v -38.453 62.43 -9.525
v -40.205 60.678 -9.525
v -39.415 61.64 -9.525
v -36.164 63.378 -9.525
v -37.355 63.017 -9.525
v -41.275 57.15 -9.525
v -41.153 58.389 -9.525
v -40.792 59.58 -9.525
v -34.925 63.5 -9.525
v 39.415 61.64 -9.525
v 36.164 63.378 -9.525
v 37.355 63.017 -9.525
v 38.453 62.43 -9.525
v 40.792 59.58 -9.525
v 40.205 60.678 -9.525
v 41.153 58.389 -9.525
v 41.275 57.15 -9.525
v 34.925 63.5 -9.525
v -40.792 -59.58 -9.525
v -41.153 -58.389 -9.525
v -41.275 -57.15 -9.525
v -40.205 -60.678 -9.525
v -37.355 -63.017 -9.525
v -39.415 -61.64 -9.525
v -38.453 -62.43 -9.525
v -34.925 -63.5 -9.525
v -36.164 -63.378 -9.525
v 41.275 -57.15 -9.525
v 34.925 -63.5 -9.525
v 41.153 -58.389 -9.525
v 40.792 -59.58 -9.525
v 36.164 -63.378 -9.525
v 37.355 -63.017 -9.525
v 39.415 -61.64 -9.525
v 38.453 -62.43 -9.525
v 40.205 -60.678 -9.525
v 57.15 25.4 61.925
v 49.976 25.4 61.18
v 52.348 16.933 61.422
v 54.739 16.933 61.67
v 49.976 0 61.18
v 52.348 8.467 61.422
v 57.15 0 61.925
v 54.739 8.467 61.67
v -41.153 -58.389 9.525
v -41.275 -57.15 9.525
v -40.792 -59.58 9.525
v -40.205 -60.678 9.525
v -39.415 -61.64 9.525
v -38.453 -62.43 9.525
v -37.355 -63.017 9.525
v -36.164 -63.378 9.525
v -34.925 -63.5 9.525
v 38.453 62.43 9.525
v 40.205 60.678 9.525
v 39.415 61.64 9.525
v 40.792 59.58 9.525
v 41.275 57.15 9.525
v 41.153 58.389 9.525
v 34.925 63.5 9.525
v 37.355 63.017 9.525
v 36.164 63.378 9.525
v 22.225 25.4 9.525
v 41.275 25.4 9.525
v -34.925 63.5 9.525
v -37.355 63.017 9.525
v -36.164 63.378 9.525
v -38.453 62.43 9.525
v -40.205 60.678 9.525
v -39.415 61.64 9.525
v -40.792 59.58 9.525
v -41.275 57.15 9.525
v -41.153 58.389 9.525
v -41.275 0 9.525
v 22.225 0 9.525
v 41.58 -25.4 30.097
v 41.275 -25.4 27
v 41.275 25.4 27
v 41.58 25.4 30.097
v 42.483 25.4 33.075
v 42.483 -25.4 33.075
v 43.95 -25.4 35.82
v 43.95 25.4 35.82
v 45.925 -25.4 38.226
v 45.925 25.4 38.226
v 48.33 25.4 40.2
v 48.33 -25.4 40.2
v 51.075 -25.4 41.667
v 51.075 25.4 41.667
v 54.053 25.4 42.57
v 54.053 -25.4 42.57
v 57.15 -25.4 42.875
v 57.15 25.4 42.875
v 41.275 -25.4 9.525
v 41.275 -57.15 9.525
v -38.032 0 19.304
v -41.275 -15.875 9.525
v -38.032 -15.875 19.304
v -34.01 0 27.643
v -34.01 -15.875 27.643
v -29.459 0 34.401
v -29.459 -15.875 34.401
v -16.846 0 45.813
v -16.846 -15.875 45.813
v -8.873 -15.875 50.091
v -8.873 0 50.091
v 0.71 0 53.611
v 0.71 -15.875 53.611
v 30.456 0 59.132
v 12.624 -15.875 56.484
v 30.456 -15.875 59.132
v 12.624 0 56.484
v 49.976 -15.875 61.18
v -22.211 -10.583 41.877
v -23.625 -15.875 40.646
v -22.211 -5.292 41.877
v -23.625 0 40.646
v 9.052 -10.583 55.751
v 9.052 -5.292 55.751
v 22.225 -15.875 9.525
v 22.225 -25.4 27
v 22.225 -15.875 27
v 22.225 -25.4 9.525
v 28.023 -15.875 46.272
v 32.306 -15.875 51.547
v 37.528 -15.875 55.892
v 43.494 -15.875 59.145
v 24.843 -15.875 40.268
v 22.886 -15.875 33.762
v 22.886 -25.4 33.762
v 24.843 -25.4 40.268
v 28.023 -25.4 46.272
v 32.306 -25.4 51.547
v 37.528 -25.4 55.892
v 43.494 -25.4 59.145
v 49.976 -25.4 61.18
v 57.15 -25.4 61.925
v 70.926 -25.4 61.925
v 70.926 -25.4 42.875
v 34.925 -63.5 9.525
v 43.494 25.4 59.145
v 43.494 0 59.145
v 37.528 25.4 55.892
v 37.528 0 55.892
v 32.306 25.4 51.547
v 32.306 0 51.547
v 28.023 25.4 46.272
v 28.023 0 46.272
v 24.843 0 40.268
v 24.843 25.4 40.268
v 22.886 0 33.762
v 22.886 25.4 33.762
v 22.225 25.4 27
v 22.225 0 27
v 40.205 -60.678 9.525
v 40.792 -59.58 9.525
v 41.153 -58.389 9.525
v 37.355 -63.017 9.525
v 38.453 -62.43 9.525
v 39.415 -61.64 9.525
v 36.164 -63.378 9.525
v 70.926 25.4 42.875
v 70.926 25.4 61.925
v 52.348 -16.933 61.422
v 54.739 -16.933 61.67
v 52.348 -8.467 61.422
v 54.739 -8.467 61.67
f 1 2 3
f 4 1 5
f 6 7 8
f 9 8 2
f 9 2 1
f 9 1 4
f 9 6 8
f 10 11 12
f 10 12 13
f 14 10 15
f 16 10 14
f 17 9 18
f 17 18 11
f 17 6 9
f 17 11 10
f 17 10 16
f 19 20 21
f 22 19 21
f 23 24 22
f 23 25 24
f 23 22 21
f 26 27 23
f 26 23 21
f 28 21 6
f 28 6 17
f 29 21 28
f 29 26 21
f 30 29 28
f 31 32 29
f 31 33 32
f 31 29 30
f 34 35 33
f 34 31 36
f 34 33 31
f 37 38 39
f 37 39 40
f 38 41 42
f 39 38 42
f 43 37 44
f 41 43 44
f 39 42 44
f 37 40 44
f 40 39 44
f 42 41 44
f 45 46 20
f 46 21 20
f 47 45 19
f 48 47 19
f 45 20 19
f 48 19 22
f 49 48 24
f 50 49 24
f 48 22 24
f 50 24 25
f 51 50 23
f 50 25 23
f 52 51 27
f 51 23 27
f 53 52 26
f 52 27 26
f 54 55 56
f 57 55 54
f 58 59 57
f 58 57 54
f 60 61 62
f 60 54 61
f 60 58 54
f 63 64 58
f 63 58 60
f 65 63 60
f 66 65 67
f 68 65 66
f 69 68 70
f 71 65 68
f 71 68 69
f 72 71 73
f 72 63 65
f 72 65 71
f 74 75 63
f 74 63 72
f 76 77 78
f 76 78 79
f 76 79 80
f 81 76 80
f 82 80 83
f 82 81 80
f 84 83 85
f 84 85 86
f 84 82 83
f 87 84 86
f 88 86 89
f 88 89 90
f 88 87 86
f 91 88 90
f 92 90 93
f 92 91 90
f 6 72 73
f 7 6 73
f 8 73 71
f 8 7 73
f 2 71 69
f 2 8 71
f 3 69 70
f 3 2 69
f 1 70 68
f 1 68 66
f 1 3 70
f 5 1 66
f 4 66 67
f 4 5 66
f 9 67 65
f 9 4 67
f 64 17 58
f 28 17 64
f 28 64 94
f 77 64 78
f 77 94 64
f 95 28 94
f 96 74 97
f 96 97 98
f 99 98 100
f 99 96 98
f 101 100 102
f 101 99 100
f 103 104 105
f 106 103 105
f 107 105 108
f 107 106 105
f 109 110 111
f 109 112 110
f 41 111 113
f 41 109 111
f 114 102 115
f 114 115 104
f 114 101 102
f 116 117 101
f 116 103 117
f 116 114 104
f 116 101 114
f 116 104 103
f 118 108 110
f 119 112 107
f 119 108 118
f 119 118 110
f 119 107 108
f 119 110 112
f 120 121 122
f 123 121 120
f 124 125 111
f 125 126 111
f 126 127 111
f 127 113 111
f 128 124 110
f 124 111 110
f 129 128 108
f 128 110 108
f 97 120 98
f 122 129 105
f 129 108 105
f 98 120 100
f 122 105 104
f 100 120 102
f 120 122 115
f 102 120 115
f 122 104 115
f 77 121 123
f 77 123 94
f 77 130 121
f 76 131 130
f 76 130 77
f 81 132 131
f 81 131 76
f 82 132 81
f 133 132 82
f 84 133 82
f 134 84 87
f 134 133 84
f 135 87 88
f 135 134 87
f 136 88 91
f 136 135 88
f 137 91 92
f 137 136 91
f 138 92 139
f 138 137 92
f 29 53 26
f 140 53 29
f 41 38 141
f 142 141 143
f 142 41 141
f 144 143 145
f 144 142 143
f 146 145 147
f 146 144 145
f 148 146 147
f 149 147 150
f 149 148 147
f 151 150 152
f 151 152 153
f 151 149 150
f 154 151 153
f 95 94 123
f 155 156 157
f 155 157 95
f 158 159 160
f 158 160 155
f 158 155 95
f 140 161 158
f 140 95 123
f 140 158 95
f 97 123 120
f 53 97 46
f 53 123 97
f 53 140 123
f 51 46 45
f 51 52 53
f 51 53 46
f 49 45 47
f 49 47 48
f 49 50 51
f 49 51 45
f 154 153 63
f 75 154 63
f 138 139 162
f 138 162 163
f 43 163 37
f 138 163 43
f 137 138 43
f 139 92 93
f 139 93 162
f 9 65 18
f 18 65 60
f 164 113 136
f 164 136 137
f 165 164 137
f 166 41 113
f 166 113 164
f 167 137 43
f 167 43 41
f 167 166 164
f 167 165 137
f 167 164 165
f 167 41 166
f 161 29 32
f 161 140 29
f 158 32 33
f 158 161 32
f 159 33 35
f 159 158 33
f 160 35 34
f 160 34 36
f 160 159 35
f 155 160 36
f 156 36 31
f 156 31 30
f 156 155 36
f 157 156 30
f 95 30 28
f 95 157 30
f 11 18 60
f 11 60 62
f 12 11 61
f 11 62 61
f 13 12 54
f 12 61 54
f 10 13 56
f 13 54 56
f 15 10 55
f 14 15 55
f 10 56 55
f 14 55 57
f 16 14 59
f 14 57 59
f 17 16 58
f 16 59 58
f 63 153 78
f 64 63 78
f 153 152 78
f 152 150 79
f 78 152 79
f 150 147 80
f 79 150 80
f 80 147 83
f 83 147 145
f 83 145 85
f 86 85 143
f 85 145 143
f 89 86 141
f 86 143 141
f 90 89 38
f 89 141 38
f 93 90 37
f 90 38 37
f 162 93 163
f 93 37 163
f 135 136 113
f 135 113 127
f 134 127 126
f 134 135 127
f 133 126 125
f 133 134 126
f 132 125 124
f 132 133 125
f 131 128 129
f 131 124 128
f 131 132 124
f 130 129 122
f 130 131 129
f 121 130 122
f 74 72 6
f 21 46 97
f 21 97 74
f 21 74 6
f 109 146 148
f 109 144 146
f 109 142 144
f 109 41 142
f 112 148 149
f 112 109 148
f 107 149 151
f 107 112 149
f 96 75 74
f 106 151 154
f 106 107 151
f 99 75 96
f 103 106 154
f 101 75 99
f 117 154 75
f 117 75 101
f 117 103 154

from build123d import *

# Parameters (mm, degrees)
F1_DEPTH = 63.5
F0_W     = 10.6006153176
F0_H     = 19.05
F2_DEPTH = 25.4
F3_DEPTH = 15.875
F4_R     = 6.35


with BuildPart() as f1:
    # F0 (on Front) → F1 (new body, symmetric)
    with BuildSketch(Plane.XZ):
        Polygon((22.225, 9.525), (-41.275, 9.525), (-41.275, -9.525), (41.275, -9.525), (41.275, 9.525), align=None)
    extrude(amount=F1_DEPTH, both=True)

    # F0 (on Front) → F2 (join, symmetric)
    with BuildSketch(Plane.XZ):
        with BuildLine():
            Line((22.225, 27.0002), (22.225, 9.525))
            Line((22.225, 9.525), (41.275, 9.525))
            Line((41.275, 9.525), (41.275, 27.0002))
            ThreePointArc((41.275, 27.0002), (45.9246798487, 38.2255201513), (57.15, 42.8752))
            Line((57.15, 42.8752), (60.325, 42.8752))
            Line((60.325, 42.8752), (60.325, 61.9252))
            Line((60.325, 61.9252), (57.15, 61.9252))
            add(Edge.make_bspline(
                [(49.9755002141, 61.180343034), (52.3379879204, 61.4198350187), (54.7300422112, 61.6659292139), (57.15, 61.9252)],
                knots=[105.9316998893, 105.9316998893, 105.9316998893, 105.9316998893, 111.5045361635, 111.5045361635, 111.5045361635, 111.5045361635], degree=3))
            ThreePointArc((49.9755002141, 61.180343034), (30.036119514, 49.0136756454), (22.225, 27.0002))
        make_face()
        with Locations((65.6253076588, 52.4002)):
            Rectangle(F0_W, F0_H)
    extrude(amount=F2_DEPTH, both=True)

    # F0 (on Front) → F3 (join)
    with BuildSketch(Plane.XZ):
        with BuildLine():
            add(Edge.make_bspline(
                [(-41.275, 9.525), (-29.1563910851, 54.461089134), (5.067965455, 56.6279406654), (49.9755002141, 61.180343034)],
                knots=[0, 0, 0, 0, 105.9316998893, 105.9316998893, 105.9316998893, 105.9316998893], degree=3))
            Line((-41.275, 9.525), (22.225, 9.525))
            Line((22.225, 9.525), (22.225, 27.0002))
            ThreePointArc((22.225, 27.0002), (30.036119514, 49.0136756454), (49.9755002141, 61.180343034))
        make_face()
    extrude(amount=F3_DEPTH)

    # F4
    f4_edges = [f1.edges().sort_by_distance(p)[0] for p in [
        (-41.275, -63.5, 0),
        (41.275, -63.5, 0),
        (-41.275, 63.5, 0),
        (41.275, 63.5, 0),
    ]]
    fillet(f4_edges, radius=F4_R)


solid = f1.part
